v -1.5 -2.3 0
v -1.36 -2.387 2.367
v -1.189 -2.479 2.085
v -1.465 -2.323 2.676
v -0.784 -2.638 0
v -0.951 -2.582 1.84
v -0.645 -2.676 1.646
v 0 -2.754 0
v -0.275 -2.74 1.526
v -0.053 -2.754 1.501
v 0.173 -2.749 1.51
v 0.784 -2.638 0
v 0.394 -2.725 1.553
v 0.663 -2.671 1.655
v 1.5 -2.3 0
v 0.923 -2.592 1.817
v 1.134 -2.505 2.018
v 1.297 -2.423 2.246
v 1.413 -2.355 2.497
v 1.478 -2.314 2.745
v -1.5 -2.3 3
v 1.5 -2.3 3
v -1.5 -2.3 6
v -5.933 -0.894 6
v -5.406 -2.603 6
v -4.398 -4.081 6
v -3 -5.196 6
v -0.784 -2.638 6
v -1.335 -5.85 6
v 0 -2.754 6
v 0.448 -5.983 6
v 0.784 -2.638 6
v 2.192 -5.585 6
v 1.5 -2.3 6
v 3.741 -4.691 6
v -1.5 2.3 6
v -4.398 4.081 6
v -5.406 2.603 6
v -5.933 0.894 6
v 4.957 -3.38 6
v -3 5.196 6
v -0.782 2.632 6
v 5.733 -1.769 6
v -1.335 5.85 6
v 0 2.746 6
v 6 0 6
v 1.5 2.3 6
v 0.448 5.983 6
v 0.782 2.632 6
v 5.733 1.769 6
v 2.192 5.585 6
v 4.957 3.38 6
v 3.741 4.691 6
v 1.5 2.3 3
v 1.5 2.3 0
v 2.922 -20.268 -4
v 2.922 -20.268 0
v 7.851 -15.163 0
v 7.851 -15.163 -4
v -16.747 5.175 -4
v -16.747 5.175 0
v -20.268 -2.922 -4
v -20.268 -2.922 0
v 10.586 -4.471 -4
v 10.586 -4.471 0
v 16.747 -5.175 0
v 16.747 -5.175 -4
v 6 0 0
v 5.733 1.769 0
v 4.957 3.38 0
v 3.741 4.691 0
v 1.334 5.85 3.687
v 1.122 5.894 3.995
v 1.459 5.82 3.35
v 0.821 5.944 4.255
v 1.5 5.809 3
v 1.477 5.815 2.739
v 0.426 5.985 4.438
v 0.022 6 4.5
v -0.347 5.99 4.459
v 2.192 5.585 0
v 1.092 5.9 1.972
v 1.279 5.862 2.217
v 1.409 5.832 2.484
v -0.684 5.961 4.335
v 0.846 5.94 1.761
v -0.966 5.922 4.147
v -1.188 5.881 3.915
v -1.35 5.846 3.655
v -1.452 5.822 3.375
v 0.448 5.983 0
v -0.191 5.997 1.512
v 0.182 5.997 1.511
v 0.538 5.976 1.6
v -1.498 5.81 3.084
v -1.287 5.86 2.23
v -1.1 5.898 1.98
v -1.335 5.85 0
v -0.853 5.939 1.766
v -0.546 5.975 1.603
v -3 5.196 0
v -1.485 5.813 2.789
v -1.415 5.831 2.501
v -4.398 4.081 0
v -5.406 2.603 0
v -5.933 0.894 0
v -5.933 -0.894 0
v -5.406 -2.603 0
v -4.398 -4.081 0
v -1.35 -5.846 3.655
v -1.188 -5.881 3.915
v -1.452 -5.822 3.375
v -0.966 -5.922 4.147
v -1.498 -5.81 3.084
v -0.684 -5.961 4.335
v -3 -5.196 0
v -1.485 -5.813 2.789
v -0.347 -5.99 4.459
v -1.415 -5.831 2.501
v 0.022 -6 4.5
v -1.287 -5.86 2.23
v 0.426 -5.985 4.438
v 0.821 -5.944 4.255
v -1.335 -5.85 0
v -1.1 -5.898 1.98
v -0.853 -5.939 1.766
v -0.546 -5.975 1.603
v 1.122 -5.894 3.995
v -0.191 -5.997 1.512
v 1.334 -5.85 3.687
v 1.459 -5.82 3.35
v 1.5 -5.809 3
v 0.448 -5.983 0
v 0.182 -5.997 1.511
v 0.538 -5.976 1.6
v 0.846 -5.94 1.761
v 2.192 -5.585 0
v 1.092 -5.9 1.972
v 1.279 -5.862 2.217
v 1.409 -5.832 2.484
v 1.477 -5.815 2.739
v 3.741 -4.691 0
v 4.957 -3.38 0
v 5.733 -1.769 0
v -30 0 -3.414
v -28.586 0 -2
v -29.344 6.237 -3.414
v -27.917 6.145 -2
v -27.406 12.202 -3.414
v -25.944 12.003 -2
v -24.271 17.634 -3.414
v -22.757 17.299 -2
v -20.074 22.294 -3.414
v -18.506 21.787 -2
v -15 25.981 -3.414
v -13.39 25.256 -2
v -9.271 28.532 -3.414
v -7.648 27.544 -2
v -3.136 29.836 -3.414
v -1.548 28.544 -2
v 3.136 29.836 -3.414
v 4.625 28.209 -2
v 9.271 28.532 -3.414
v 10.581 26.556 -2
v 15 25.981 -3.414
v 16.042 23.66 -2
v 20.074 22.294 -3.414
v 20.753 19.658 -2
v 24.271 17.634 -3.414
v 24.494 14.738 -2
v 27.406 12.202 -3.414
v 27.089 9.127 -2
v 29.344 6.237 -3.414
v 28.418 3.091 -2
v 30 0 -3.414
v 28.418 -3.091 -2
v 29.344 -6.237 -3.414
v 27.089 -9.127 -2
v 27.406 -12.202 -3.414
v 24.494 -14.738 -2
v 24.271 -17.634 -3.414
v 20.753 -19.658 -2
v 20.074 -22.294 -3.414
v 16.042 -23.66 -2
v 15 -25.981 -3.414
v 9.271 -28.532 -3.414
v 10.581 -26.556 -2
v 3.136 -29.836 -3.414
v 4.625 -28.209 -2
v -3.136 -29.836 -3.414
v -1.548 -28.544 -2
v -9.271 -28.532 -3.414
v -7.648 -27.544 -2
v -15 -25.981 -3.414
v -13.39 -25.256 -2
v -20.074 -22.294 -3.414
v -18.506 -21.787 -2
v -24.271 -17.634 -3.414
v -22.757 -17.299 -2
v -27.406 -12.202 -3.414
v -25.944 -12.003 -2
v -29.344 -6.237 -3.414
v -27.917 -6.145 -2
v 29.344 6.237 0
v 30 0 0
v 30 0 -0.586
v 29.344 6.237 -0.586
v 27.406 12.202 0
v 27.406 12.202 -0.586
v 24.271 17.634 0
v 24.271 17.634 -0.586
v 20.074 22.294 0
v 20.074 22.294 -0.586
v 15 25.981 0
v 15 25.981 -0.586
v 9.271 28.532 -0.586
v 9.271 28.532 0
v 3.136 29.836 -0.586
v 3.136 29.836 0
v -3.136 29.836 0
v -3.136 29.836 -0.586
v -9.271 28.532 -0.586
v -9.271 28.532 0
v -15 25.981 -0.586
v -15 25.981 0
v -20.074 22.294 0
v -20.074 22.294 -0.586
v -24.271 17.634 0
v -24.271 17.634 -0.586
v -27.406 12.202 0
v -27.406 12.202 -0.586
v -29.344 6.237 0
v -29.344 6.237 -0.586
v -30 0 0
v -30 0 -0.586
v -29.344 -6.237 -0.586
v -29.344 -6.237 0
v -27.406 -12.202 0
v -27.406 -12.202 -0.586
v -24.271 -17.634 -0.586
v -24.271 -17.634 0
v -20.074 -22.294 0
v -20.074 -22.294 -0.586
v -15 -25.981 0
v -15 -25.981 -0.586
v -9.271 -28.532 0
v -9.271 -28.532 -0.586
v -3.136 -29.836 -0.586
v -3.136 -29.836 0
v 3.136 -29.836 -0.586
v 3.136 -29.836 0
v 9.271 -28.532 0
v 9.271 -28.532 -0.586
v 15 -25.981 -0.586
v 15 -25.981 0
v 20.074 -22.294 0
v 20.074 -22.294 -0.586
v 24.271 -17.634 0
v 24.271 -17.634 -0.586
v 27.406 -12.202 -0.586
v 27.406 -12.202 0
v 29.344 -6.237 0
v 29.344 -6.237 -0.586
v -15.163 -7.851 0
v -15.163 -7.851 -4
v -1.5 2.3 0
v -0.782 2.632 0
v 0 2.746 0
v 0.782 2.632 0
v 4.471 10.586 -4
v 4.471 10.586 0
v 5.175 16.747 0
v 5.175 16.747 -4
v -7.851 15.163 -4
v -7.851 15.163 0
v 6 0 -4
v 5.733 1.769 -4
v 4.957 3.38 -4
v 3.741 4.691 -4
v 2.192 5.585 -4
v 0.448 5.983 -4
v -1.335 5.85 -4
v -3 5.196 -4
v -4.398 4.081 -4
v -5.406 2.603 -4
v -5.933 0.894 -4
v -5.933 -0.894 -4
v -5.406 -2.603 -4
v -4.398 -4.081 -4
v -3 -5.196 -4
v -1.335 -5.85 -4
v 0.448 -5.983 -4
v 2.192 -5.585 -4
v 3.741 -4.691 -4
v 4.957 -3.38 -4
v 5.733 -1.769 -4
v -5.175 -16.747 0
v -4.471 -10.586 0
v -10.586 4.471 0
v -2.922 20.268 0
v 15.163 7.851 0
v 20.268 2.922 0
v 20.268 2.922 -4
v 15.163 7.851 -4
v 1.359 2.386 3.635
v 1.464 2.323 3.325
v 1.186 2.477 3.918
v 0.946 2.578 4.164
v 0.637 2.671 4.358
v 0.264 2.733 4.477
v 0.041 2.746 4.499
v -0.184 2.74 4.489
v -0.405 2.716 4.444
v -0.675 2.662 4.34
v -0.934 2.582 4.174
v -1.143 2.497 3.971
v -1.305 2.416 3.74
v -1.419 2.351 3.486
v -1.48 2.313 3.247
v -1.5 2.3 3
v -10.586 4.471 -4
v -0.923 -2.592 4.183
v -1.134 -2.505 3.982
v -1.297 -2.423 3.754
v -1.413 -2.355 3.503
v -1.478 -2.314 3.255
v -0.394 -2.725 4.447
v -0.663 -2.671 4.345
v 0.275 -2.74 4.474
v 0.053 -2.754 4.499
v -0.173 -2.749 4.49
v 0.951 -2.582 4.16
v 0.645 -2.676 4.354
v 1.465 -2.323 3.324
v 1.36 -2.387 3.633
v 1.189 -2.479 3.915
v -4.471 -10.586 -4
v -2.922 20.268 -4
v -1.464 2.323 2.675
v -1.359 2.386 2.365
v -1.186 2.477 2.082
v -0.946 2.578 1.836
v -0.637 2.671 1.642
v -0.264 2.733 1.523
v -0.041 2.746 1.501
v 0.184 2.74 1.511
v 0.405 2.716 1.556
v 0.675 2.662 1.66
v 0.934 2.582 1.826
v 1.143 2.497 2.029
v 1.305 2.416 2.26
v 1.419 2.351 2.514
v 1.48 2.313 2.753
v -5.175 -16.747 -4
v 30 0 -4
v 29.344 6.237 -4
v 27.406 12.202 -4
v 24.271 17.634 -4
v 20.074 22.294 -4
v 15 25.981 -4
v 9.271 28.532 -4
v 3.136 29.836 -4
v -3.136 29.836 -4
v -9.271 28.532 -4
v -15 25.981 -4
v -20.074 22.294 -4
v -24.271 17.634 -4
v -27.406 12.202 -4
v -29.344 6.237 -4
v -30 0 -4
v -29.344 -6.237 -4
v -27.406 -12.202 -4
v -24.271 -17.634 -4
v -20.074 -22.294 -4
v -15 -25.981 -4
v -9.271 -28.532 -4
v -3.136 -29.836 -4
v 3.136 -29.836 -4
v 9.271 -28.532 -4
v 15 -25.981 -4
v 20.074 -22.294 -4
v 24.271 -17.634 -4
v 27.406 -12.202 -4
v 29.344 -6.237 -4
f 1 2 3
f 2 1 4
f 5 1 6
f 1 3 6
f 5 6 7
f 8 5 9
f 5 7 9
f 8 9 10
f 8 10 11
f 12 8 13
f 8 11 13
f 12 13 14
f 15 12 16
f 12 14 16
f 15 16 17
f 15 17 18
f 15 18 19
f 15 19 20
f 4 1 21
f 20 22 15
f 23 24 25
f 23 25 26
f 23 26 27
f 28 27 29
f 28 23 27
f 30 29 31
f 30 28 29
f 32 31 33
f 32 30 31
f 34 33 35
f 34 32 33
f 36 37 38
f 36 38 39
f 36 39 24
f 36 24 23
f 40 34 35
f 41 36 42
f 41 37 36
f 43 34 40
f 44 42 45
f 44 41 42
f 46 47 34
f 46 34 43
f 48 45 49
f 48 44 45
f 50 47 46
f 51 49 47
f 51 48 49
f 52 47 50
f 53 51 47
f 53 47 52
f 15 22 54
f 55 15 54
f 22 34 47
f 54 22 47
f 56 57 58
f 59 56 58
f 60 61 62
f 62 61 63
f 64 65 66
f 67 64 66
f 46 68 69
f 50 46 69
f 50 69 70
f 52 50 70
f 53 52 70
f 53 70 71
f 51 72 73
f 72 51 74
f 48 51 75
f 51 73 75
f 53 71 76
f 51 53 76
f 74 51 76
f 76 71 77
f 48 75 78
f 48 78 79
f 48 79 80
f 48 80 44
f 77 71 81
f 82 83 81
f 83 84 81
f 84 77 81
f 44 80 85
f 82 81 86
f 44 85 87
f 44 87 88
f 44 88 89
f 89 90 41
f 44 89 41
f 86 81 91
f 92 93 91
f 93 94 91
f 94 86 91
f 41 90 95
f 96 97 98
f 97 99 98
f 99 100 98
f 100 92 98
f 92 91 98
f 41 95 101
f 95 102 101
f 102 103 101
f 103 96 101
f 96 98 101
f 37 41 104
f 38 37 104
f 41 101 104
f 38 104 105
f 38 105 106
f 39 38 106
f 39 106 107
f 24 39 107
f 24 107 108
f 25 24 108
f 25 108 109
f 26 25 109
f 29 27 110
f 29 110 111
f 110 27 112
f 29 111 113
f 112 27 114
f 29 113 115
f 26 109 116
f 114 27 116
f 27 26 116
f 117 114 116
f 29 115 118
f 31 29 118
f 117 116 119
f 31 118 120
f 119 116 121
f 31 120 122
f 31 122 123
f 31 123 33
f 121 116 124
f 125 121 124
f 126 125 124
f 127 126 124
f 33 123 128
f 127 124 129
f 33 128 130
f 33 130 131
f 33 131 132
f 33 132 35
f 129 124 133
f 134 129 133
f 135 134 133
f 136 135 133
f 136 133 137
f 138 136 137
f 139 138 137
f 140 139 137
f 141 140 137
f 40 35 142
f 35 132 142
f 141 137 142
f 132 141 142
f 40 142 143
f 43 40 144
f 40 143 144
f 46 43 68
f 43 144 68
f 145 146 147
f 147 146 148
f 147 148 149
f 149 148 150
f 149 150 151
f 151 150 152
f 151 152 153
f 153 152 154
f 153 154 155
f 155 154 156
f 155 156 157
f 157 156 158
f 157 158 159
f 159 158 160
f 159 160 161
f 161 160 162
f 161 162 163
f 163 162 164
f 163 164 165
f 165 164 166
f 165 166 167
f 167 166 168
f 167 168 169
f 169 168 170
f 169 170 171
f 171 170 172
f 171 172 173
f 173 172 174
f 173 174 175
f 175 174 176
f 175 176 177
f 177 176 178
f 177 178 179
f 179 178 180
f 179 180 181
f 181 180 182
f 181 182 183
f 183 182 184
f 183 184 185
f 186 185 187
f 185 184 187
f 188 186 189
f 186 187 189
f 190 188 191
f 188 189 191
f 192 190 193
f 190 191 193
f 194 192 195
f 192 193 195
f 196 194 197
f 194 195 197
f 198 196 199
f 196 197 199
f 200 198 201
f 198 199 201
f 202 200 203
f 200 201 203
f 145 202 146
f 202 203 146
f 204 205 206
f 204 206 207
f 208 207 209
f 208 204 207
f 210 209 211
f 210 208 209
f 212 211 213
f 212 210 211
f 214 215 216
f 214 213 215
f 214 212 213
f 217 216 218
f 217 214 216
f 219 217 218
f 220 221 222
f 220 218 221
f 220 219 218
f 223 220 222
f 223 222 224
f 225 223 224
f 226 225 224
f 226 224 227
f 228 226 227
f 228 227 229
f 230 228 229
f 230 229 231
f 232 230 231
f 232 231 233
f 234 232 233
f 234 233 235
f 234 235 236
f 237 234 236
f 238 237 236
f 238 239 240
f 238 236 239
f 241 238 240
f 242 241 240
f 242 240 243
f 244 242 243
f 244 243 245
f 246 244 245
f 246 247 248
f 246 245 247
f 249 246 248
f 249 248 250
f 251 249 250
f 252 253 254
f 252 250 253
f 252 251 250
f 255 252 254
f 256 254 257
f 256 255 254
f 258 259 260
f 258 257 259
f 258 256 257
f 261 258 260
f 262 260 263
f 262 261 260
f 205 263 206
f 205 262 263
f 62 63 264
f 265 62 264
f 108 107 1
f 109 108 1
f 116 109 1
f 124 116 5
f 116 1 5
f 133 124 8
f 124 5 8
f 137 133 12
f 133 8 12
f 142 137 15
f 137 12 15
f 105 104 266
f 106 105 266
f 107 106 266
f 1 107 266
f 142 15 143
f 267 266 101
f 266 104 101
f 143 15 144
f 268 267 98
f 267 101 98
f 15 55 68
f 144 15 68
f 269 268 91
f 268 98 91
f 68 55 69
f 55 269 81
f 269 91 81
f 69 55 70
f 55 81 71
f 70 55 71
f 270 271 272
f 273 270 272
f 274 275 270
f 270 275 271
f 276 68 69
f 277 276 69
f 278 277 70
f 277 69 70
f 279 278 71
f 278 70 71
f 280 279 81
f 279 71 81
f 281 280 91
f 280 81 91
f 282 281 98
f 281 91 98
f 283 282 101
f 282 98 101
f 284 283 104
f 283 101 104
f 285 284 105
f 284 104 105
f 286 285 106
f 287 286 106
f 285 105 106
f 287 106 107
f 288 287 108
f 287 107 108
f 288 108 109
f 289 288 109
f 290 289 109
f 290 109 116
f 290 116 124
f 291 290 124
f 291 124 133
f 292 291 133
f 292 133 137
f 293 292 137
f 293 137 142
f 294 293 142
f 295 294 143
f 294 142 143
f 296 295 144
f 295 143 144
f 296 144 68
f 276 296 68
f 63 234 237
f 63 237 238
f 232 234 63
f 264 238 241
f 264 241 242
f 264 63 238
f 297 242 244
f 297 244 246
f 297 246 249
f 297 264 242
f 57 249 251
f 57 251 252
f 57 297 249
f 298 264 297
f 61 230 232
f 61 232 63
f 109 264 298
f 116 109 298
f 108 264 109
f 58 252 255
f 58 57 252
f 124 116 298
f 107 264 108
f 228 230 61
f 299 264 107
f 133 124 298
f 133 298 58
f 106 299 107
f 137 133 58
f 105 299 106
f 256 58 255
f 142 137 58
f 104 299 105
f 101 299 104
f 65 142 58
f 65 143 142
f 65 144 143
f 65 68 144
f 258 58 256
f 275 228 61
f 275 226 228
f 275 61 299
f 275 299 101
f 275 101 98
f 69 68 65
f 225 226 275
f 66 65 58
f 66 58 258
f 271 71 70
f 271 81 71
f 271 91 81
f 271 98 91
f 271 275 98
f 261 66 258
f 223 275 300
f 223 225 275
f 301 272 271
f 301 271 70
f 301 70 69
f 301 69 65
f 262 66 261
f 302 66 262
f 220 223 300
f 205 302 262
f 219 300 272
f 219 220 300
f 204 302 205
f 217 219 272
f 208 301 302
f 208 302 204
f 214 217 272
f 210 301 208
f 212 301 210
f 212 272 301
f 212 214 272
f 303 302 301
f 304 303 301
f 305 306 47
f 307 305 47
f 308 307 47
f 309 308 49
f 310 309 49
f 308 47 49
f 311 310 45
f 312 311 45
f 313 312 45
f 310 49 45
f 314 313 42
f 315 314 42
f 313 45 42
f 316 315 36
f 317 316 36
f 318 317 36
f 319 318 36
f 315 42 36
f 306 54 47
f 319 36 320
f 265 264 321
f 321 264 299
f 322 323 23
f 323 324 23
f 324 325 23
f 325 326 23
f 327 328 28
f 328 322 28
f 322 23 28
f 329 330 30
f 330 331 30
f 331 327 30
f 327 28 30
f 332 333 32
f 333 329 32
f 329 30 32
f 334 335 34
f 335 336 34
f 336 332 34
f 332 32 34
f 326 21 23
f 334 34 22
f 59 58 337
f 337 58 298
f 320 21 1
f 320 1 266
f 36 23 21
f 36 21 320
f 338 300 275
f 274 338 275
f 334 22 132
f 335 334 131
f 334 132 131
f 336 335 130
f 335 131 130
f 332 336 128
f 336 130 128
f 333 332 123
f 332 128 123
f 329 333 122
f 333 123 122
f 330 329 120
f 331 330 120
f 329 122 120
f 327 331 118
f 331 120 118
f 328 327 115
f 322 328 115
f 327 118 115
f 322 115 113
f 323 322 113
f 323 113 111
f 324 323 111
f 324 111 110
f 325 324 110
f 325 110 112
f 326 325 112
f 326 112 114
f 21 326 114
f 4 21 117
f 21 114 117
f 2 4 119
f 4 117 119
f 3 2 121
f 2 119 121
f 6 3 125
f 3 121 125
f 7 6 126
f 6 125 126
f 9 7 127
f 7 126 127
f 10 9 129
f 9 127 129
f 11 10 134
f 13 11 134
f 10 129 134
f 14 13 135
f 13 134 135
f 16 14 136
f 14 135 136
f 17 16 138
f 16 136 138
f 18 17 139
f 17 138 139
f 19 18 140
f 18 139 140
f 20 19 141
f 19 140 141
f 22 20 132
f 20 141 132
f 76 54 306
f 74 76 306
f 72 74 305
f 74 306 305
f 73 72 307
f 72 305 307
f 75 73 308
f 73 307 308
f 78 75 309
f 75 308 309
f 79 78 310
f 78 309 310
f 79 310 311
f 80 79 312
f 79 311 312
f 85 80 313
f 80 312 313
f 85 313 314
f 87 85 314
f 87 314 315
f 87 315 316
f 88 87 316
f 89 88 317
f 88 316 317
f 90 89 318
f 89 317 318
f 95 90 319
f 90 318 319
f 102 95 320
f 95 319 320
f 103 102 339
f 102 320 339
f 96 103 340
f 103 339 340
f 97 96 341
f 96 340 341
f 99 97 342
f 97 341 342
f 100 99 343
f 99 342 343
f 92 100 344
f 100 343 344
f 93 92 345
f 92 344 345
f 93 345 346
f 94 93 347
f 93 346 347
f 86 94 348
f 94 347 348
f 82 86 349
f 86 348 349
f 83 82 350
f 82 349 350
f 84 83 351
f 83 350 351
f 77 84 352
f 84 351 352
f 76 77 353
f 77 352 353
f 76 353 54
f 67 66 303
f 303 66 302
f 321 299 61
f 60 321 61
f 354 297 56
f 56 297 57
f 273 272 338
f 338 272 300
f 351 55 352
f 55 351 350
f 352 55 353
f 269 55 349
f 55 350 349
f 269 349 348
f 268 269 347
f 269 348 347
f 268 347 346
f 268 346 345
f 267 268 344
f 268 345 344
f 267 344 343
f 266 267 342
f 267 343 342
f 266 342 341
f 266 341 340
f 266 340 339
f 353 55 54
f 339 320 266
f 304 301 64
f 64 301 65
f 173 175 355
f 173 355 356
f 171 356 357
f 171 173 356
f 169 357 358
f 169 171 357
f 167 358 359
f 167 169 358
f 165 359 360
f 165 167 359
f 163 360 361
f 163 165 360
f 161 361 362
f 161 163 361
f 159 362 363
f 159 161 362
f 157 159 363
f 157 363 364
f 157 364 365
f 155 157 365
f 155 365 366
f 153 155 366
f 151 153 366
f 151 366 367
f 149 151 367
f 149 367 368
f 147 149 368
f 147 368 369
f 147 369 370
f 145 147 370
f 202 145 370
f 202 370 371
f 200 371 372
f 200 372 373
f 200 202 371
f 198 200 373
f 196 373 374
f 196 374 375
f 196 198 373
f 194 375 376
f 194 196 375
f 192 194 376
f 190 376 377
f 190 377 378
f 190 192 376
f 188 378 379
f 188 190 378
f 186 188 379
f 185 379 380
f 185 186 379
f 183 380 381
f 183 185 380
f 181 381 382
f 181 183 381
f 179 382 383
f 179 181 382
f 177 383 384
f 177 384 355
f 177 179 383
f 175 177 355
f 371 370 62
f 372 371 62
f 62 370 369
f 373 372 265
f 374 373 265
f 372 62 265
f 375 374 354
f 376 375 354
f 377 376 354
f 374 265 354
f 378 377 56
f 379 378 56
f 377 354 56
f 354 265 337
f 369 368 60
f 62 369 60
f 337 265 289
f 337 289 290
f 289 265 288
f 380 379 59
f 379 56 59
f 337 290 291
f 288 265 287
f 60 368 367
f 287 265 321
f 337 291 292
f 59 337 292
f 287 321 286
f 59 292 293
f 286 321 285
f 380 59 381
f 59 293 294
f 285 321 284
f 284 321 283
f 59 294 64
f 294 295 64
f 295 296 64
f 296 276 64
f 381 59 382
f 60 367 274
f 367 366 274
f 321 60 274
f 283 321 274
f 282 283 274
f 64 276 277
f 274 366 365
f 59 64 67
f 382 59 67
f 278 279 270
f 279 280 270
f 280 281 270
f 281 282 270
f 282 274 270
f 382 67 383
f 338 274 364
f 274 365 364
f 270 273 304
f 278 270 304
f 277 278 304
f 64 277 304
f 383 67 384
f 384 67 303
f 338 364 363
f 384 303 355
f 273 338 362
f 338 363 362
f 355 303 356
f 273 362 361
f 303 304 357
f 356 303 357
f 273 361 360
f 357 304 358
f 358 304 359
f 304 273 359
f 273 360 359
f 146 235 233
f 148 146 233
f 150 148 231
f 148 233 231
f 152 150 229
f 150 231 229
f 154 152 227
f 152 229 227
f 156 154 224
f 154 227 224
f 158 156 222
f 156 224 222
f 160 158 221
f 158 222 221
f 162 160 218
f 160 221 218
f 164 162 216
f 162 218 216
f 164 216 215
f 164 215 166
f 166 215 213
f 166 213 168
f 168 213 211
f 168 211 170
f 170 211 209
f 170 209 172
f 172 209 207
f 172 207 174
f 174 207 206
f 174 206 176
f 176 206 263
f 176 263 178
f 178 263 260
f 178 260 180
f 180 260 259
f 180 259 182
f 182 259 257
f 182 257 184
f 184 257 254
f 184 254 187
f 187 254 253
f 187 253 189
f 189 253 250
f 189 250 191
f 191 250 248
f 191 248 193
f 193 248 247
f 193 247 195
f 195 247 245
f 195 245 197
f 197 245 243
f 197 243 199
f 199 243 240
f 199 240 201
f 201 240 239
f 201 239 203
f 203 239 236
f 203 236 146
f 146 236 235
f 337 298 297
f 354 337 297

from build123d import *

# Parameters (mm, degrees)
F0_R             = 30
F0_R_2           = 6
F1_DEPTH         = 4
F2_DEPTH         = 6
F3_R             = 1.5
F4_DEPTH         = 12.5
F5_W             = 3
F5_H             = 4.6
F6_DEPTH         = 9.4
F10_DEPTH        = 4
F10_COPIES_COUNT = 4


# Not quite as in the source:
# - a pattern or mirror of a feature is missing from the dataset's text; its kind, count and spacing are read off the source's solid


with BuildPart() as f1:
    # F0 (on Top) → F1 (new body)
    with BuildSketch(Plane.XY):
        Circle(F0_R)
        Circle(F0_R_2, mode=Mode.SUBTRACT)
    extrude(amount=-F1_DEPTH)

    # F7 (on Front) → F8 (revolve, cut)
    with BuildSketch(Plane.XZ):
        Polygon((-30, -0.5857864376), (-30, -3.4142135624), (-28.5857864376, -2), align=None)
    revolve(axis=Axis((0, 0, 1.4569712803), (0, 0, -1)), mode=Mode.SUBTRACT)

    # F9 (on face) → F10 (cut, through all)
    with BuildSketch(Plane.XY):
        Polygon((-2.9223964084, 20.2681515366), (-7.8513491899, 15.1631673798), (4.471027758, 10.586284101), (5.1751635037, 16.7474728078), align=None)
    f10 = extrude(amount=-F10_DEPTH, mode=Mode.SUBTRACT)

    # F10_copies: F10 ×4 about axis
    f10_copies_axis = Axis((0, 0, 0), (0, 0, 1))
    for i in range(1, F10_COPIES_COUNT):
        add(f10.rotate(f10_copies_axis, i * 360 / F10_COPIES_COUNT), mode=Mode.SUBTRACT)


with BuildPart() as f2:
    # F0 (on Top) → F2 (new body)
    with BuildSketch(Plane.XY):
        Circle(F0_R_2)
    extrude(amount=F2_DEPTH)

    # F3 (on Front) → F4 (cut, symmetric)
    with BuildSketch(Plane.XZ):
        with Locations((0, 3)):
            Circle(F3_R)
    extrude(amount=F4_DEPTH, both=True, mode=Mode.SUBTRACT)

    # F5 (on face) → F6 (cut)
    with BuildSketch(Plane.XY.offset(6)):
        Rectangle(F5_W, F5_H)
        with BuildLine():
            Line((1.5, -2.3), (-1.5, -2.3))
            ThreePointArc((-1.5, -2.3), (0, -2.7540939565), (1.5, -2.3))
        make_face()
        with BuildLine():
            ThreePointArc((1.5, 2.3), (0, 2.7459060435), (-1.5, 2.3))
            Line((-1.5, 2.3), (1.5, 2.3))
        make_face()
    extrude(amount=-F6_DEPTH, mode=Mode.SUBTRACT)


solid = Compound([f1.part, f2.part])
